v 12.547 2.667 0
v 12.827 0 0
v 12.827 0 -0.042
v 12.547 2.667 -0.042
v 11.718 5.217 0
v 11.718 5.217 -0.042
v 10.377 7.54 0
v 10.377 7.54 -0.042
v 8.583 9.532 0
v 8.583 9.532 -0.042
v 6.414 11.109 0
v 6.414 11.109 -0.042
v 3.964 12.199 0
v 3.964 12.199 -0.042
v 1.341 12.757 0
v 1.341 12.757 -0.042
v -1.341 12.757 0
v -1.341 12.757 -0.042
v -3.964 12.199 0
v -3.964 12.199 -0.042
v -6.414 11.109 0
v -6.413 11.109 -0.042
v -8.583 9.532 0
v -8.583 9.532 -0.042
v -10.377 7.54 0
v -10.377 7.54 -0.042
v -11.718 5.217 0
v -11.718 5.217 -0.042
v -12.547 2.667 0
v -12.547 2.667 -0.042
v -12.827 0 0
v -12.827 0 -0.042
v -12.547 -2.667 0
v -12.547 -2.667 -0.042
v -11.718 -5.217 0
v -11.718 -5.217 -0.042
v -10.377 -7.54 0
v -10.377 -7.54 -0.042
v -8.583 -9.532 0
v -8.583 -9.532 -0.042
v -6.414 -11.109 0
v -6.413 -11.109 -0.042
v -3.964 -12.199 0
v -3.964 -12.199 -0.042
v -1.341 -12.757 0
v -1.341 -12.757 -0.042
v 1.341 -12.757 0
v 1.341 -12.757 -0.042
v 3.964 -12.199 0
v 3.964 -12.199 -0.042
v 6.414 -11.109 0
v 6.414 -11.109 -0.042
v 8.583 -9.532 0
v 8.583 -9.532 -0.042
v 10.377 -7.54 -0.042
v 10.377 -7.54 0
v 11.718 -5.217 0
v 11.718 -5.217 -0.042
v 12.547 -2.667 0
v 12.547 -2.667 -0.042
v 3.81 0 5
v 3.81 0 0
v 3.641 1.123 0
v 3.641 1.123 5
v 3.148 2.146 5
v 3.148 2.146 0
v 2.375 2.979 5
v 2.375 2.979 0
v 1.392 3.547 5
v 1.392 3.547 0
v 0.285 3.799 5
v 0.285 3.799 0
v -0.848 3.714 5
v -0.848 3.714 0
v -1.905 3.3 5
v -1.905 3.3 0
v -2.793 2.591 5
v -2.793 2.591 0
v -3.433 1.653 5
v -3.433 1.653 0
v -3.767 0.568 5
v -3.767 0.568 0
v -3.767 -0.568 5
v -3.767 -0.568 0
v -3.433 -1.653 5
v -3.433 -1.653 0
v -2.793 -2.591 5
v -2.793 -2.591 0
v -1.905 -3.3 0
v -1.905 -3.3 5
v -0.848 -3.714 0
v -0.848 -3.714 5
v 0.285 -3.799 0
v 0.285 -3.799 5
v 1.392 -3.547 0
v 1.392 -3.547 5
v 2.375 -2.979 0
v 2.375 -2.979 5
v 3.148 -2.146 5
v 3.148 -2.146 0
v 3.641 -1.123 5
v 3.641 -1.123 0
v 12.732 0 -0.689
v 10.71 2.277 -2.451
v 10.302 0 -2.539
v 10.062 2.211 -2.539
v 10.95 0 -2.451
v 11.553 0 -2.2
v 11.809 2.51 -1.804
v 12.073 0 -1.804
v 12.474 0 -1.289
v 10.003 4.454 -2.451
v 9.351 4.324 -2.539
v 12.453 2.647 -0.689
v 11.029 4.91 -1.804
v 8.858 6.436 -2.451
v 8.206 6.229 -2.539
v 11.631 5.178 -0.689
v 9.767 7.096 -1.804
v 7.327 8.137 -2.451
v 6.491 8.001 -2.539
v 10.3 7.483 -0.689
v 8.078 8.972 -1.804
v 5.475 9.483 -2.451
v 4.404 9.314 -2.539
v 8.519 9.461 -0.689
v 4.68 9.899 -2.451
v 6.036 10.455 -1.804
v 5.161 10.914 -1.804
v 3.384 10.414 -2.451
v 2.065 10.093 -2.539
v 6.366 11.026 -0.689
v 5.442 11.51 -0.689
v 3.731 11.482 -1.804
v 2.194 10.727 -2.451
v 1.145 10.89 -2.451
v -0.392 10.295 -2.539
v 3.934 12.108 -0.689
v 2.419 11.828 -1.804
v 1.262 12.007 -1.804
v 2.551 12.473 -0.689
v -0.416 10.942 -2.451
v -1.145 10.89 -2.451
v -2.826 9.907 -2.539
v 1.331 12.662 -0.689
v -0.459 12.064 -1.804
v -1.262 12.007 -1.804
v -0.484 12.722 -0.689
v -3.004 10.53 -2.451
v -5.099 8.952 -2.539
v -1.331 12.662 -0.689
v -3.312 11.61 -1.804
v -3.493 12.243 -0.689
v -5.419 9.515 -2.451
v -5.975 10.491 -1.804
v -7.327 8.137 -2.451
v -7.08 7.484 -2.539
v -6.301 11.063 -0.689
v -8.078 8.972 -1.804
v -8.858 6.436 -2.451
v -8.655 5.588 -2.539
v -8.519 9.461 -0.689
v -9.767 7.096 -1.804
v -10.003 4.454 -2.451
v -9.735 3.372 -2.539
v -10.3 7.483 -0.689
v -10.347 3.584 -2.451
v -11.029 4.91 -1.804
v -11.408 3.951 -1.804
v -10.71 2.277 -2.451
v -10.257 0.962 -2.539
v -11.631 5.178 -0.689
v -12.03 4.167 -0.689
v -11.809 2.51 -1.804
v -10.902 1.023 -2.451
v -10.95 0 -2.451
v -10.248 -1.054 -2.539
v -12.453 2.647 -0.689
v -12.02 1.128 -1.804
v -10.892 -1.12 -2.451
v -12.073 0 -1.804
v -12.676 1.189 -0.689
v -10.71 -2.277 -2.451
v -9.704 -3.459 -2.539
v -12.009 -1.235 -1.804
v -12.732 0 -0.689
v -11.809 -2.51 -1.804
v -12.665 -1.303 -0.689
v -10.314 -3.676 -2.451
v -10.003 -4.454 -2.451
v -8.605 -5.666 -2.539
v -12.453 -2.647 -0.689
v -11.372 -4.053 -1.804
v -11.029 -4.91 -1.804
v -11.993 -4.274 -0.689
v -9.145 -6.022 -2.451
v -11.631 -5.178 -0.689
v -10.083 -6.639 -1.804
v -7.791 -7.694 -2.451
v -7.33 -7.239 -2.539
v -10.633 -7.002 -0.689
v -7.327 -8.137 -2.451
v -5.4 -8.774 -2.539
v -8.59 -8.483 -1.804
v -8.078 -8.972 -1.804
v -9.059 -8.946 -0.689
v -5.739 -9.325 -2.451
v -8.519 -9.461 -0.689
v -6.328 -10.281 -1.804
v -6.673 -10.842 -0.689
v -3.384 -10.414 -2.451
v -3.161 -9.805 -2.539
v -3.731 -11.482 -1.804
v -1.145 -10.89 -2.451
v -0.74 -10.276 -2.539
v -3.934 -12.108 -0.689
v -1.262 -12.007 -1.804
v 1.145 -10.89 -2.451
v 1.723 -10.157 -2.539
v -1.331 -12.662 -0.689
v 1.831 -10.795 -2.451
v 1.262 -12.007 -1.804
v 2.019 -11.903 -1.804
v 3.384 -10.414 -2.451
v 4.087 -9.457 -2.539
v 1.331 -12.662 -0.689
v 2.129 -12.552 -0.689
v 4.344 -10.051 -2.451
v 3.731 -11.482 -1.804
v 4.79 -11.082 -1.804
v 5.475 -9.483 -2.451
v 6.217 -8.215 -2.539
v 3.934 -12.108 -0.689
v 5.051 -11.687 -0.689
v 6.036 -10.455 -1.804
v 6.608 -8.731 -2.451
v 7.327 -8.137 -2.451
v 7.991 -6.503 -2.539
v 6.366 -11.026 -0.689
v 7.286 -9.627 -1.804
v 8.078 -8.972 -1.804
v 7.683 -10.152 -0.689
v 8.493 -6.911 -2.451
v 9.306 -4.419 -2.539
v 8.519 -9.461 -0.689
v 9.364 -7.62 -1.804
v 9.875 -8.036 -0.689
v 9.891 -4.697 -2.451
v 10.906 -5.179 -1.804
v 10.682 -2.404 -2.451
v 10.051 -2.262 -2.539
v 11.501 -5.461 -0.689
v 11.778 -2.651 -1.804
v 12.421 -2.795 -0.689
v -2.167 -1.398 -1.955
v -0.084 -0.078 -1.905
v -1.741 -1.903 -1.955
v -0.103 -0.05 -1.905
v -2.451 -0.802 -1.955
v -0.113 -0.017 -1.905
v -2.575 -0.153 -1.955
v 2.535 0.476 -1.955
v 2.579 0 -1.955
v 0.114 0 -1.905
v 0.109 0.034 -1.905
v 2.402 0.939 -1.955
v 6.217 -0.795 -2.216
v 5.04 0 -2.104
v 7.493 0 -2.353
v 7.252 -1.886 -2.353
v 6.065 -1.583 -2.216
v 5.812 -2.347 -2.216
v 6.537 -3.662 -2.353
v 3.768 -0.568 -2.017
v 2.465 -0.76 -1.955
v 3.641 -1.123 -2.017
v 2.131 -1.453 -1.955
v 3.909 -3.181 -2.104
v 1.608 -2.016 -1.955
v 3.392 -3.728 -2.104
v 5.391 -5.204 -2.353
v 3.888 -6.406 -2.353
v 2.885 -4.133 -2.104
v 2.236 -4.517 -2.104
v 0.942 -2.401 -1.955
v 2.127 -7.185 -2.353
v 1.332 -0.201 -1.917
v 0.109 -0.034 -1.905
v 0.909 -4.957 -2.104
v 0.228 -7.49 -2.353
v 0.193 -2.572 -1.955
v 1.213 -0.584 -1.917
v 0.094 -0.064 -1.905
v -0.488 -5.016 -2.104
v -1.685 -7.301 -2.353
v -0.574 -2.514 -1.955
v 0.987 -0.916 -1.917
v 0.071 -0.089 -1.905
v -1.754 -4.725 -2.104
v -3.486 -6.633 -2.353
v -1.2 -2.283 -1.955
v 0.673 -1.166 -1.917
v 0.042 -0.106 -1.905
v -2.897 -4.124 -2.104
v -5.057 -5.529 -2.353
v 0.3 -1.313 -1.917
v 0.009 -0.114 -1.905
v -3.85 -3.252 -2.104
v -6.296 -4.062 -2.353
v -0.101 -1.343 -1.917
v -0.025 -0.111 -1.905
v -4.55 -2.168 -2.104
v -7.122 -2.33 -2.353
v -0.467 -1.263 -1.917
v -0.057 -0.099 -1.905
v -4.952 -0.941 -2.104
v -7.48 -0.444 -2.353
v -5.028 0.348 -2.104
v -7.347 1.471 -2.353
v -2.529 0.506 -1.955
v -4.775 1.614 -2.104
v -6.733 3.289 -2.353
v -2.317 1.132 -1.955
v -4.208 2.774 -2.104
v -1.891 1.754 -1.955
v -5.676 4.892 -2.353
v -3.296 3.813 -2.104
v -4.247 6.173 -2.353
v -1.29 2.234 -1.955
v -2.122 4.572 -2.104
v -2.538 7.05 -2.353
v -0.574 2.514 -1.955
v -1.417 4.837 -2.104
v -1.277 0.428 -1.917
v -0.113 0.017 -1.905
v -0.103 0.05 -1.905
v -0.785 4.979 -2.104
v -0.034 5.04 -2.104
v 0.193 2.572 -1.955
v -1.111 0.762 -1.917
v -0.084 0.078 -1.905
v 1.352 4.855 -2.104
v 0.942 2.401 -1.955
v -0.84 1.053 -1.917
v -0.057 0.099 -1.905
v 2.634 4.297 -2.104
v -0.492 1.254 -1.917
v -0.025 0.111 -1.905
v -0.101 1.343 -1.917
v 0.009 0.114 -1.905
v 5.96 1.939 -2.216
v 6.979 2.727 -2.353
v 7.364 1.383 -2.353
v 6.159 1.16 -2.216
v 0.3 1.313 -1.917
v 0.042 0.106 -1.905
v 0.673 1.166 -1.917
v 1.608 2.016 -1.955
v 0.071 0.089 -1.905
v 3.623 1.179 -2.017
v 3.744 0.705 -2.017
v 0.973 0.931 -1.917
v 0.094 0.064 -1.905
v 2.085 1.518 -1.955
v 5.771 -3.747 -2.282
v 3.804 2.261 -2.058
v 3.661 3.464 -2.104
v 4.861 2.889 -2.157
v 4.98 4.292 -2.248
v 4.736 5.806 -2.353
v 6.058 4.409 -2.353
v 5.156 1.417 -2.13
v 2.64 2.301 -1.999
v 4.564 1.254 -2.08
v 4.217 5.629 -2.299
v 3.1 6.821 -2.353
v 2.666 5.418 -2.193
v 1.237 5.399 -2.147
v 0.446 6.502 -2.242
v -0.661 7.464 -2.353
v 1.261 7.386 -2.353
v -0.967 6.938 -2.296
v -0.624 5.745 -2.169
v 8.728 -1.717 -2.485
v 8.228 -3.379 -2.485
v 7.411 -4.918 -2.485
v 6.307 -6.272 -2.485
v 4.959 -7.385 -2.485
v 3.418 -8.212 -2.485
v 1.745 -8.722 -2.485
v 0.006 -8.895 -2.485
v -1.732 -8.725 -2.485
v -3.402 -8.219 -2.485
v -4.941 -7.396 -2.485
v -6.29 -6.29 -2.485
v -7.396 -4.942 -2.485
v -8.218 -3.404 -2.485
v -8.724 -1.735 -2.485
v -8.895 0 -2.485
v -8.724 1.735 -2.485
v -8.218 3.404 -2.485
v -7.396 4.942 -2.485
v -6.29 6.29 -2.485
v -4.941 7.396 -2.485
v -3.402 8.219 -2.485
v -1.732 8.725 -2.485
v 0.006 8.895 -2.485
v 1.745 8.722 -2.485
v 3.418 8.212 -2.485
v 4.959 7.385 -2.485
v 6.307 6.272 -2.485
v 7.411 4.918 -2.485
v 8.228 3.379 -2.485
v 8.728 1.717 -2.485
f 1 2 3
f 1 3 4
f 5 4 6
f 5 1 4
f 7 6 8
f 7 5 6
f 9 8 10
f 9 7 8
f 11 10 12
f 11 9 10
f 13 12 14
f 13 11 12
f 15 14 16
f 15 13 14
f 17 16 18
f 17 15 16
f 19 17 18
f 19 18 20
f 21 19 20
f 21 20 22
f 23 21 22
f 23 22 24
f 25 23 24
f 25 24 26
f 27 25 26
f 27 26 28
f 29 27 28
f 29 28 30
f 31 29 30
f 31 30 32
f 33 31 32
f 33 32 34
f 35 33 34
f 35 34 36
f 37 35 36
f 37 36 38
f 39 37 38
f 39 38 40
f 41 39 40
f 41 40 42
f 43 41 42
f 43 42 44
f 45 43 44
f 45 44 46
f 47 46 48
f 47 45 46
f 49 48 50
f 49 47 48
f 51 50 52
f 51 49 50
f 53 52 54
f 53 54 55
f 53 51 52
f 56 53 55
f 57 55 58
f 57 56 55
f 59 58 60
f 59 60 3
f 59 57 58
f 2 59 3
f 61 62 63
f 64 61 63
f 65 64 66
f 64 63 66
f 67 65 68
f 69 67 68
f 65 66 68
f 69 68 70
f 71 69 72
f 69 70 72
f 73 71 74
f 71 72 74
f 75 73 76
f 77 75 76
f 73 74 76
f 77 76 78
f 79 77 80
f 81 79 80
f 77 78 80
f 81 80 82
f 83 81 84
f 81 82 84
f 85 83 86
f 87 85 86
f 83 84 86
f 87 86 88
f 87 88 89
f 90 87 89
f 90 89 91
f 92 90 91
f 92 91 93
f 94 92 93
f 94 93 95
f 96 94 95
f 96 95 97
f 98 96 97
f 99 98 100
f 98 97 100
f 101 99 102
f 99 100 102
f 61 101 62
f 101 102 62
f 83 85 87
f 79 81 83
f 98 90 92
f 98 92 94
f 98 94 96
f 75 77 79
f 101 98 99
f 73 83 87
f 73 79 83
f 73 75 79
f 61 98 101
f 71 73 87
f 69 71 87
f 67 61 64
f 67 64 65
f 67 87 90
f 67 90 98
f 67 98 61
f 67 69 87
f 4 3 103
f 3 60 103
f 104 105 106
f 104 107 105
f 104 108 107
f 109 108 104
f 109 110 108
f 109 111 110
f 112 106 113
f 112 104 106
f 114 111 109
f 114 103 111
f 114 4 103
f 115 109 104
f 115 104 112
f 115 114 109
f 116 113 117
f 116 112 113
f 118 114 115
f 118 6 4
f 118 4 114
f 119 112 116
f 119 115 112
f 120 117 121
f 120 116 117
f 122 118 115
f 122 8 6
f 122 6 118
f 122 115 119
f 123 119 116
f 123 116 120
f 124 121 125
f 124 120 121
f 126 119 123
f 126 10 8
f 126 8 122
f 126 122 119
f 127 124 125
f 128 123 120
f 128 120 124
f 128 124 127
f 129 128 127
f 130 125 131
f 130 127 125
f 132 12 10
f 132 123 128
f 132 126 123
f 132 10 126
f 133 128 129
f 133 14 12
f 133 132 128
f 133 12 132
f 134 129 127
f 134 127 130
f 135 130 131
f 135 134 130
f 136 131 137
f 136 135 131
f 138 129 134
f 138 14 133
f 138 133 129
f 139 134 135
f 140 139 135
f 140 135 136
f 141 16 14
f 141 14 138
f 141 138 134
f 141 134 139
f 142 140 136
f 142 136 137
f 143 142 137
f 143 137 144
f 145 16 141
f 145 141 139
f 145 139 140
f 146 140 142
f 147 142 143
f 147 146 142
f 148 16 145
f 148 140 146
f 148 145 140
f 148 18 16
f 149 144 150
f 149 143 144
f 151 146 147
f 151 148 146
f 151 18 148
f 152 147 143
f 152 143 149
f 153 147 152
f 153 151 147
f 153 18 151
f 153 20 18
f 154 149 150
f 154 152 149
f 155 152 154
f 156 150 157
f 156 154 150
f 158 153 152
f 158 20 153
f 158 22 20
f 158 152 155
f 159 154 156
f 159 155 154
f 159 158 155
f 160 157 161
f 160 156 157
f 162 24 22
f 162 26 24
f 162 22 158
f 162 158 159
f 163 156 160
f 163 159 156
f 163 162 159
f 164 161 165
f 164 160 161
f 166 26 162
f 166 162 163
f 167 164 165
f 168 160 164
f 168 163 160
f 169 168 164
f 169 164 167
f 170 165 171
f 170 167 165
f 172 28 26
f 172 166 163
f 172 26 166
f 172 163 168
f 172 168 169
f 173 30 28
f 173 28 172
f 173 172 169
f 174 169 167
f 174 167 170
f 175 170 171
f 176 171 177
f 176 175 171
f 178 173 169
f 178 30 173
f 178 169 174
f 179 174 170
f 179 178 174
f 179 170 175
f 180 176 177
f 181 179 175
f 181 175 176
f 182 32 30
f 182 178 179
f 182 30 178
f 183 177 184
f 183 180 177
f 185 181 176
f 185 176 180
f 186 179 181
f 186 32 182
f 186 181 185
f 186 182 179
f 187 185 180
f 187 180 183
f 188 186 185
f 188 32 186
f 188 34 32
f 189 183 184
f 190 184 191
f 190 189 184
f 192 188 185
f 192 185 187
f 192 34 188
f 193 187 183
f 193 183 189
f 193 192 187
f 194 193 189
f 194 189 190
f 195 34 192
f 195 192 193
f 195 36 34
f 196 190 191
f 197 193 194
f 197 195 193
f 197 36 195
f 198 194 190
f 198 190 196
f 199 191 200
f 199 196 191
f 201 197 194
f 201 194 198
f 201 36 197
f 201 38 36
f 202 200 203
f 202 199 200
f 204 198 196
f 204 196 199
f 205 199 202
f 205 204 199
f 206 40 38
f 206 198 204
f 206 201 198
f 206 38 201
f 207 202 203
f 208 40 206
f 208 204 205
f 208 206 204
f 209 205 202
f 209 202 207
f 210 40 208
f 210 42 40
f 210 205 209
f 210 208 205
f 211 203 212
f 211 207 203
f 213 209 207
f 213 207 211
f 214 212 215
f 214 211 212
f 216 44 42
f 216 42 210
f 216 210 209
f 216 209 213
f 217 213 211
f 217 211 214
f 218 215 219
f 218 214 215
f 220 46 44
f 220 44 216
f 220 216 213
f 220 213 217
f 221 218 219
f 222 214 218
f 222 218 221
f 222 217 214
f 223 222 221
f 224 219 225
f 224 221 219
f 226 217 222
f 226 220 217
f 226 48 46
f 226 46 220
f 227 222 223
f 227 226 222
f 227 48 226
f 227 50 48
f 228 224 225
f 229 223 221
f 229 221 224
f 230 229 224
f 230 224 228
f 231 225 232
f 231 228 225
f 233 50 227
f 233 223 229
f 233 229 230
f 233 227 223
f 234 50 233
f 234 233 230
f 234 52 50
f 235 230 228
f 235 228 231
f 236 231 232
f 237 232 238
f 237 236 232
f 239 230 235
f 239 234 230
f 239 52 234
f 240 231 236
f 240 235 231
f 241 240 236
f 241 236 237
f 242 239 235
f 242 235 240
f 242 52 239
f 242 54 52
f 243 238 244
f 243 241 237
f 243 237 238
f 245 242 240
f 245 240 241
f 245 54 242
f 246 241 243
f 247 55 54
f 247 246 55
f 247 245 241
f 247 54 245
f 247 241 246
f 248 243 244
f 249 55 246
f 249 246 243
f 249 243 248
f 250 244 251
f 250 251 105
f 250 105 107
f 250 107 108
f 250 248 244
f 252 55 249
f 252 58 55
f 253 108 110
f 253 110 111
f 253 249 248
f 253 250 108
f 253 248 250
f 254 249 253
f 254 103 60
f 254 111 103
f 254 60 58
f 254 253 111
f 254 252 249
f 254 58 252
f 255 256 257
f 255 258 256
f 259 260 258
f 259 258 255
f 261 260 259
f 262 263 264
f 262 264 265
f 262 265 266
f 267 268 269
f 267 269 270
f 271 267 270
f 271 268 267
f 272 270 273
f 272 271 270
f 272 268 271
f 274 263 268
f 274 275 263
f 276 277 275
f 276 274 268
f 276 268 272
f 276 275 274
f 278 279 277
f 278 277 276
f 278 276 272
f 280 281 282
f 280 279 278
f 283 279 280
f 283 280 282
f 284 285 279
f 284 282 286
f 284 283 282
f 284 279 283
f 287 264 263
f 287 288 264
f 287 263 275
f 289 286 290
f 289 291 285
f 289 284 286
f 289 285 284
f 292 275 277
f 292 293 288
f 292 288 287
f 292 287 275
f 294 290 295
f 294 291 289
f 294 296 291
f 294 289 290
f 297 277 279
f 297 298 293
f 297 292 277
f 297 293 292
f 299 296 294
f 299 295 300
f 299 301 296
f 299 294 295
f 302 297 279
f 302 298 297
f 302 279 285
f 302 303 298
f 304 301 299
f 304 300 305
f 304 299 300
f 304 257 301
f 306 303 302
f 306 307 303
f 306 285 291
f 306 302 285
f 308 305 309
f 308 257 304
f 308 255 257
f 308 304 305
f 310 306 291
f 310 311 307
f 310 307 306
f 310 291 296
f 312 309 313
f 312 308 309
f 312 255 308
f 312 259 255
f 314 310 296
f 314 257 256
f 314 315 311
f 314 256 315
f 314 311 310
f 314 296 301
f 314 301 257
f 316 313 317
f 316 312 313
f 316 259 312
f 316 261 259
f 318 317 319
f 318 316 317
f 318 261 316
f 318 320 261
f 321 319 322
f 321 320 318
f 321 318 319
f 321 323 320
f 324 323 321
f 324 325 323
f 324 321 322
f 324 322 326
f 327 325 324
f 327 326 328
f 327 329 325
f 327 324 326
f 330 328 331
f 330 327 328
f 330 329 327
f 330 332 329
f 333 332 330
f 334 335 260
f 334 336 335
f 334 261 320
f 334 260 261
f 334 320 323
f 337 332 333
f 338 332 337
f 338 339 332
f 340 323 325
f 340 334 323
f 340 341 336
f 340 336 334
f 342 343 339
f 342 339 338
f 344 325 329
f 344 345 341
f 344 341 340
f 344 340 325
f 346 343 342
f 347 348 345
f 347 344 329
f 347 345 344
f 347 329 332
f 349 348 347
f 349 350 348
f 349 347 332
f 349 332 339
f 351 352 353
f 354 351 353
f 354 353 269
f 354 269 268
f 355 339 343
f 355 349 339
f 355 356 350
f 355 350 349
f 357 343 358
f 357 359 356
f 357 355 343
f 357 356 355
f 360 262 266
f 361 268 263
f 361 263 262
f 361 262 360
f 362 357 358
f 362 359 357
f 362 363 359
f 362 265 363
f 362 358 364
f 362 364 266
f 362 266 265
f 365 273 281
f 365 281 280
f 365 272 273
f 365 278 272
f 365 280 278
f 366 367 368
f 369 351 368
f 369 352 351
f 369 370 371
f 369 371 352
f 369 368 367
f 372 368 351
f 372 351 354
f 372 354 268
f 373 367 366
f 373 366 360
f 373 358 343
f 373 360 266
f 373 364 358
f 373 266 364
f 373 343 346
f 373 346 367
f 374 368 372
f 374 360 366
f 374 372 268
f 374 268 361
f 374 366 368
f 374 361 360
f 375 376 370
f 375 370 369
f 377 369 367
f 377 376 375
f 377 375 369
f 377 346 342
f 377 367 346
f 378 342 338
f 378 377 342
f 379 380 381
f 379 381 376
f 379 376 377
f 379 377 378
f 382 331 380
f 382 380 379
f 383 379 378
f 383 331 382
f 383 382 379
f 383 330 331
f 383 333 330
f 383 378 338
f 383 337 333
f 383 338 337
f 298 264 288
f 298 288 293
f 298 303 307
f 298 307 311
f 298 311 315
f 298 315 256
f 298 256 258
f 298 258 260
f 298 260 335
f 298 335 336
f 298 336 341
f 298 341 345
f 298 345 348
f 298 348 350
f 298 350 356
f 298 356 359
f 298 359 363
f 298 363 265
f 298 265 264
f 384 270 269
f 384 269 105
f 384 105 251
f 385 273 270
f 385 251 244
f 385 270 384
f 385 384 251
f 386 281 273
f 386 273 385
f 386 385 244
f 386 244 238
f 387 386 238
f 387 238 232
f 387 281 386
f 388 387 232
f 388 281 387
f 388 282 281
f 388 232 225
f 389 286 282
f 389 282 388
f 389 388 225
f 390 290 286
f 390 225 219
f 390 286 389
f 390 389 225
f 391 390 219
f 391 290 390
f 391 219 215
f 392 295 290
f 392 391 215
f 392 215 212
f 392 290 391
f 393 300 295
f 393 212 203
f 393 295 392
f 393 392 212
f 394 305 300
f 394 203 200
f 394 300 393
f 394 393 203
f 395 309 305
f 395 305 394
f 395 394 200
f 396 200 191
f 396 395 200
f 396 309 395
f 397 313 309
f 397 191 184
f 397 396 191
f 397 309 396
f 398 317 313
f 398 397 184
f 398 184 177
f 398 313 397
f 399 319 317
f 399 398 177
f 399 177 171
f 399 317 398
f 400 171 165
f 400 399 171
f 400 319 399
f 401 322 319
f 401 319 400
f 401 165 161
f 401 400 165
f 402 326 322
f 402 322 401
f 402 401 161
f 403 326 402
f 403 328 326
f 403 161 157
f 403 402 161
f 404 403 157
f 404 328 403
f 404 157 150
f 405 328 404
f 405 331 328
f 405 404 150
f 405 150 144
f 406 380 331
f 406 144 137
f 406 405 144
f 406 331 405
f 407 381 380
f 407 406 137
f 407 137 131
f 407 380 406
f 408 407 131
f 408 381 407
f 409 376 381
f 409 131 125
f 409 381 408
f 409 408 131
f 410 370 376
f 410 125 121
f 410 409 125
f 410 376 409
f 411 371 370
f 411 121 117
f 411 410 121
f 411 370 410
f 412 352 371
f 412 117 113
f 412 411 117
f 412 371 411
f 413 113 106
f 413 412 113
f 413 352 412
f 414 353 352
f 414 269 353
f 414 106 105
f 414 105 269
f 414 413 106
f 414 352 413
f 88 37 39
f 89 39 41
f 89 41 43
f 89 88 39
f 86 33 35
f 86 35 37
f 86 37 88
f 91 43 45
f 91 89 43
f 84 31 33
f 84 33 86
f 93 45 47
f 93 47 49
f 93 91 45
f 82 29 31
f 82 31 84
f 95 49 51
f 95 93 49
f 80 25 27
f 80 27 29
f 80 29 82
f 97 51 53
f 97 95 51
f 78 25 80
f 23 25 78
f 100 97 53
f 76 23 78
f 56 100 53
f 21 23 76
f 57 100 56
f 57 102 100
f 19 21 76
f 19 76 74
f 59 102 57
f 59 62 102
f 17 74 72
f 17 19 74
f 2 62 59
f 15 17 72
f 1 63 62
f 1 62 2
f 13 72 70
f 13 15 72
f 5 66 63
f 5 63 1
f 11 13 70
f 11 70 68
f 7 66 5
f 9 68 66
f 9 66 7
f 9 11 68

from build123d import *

# Parameters (mm, degrees)
F0_R     = 12.827
F1_DEPTH = 2.54
F2_R     = 8.89
F3_DEPTH = 0.635
F5_R     = 25.4
F7_R     = 3.81
F8_DEPTH = 5


# Not quite as in the source:
# - a fillet or chamfer that OpenCascade refuses, or shapes differently, is made with other operations: its cross-section is extruded or revolved along the edge and cut away or added


with BuildPart() as f1:
    # F0 (on Top) → F1 (new body)
    with BuildSketch(Plane.XY):
        Circle(F0_R)
    extrude(amount=-F1_DEPTH)

    # F2 (on face) → F3 (cut)
    with BuildSketch(Plane(origin=(0, 0, -2.54), x_dir=(1, 0, 0), z_dir=(0, 0, -1))):
        Circle(F2_R)
    extrude(amount=-F3_DEPTH, mode=Mode.SUBTRACT)

    # F4: fillet of radius 60.96 on 1 edges, made by hand

    # F4_s1 → F4_t2 (revolve)
    with BuildSketch(Plane.XZ):
        with BuildLine():
            ThreePointArc((8.89, -2.54), (4.5135344509, -2.0639572458), (0.1141253997, -1.905))
            Line((0.1141253997, -1.905), (8.89, -1.905))
            Line((8.89, -1.905), (8.89, -2.54))
        make_face()
    revolve(axis=Axis((0, 0, -1.905), (0, 0, -1)))

    # F5
    f5_edges = [f1.edges().sort_by_distance(p)[0] for p in [
        (-8.89, 0, -2.54),
    ]]
    fillet(f5_edges, radius=F5_R)

    # F6: fillet of radius 2.54 on 1 edges, made by hand

    # F6_s1 → F6_t2 (revolve, cut)
    with BuildSketch(Plane.XZ):
        with BuildLine():
            ThreePointArc((10.2547372433, -2.5384738057), (12.0719517601, -1.8053490766), (12.8274, 0.0026991598))
            Line((12.8274, 0.0026991598), (13.0815365685, 0.0026991598))
            ThreePointArc((13.0815365685, 0.0026991598), (13.0811365685, -1.2686504201), (13.0811365685, -2.54))
            Line((13.0811365685, -2.54), (12.827, -2.7941365685))
            ThreePointArc((12.827, -2.7941365685), (10.5675446967, -2.7941365685), (10.2516075362, -2.7925911022))
            Line((10.2516075362, -2.7925911022), (10.2547372433, -2.5384738057))
        make_face()
    revolve(axis=Axis((0, 0, -2.54), (0, 0, 1)), mode=Mode.SUBTRACT)

    # F7 (on face) → F8 (join)
    with BuildSketch(Plane.XY):
        Circle(F7_R)
    extrude(amount=F8_DEPTH)


solid = f1.part
